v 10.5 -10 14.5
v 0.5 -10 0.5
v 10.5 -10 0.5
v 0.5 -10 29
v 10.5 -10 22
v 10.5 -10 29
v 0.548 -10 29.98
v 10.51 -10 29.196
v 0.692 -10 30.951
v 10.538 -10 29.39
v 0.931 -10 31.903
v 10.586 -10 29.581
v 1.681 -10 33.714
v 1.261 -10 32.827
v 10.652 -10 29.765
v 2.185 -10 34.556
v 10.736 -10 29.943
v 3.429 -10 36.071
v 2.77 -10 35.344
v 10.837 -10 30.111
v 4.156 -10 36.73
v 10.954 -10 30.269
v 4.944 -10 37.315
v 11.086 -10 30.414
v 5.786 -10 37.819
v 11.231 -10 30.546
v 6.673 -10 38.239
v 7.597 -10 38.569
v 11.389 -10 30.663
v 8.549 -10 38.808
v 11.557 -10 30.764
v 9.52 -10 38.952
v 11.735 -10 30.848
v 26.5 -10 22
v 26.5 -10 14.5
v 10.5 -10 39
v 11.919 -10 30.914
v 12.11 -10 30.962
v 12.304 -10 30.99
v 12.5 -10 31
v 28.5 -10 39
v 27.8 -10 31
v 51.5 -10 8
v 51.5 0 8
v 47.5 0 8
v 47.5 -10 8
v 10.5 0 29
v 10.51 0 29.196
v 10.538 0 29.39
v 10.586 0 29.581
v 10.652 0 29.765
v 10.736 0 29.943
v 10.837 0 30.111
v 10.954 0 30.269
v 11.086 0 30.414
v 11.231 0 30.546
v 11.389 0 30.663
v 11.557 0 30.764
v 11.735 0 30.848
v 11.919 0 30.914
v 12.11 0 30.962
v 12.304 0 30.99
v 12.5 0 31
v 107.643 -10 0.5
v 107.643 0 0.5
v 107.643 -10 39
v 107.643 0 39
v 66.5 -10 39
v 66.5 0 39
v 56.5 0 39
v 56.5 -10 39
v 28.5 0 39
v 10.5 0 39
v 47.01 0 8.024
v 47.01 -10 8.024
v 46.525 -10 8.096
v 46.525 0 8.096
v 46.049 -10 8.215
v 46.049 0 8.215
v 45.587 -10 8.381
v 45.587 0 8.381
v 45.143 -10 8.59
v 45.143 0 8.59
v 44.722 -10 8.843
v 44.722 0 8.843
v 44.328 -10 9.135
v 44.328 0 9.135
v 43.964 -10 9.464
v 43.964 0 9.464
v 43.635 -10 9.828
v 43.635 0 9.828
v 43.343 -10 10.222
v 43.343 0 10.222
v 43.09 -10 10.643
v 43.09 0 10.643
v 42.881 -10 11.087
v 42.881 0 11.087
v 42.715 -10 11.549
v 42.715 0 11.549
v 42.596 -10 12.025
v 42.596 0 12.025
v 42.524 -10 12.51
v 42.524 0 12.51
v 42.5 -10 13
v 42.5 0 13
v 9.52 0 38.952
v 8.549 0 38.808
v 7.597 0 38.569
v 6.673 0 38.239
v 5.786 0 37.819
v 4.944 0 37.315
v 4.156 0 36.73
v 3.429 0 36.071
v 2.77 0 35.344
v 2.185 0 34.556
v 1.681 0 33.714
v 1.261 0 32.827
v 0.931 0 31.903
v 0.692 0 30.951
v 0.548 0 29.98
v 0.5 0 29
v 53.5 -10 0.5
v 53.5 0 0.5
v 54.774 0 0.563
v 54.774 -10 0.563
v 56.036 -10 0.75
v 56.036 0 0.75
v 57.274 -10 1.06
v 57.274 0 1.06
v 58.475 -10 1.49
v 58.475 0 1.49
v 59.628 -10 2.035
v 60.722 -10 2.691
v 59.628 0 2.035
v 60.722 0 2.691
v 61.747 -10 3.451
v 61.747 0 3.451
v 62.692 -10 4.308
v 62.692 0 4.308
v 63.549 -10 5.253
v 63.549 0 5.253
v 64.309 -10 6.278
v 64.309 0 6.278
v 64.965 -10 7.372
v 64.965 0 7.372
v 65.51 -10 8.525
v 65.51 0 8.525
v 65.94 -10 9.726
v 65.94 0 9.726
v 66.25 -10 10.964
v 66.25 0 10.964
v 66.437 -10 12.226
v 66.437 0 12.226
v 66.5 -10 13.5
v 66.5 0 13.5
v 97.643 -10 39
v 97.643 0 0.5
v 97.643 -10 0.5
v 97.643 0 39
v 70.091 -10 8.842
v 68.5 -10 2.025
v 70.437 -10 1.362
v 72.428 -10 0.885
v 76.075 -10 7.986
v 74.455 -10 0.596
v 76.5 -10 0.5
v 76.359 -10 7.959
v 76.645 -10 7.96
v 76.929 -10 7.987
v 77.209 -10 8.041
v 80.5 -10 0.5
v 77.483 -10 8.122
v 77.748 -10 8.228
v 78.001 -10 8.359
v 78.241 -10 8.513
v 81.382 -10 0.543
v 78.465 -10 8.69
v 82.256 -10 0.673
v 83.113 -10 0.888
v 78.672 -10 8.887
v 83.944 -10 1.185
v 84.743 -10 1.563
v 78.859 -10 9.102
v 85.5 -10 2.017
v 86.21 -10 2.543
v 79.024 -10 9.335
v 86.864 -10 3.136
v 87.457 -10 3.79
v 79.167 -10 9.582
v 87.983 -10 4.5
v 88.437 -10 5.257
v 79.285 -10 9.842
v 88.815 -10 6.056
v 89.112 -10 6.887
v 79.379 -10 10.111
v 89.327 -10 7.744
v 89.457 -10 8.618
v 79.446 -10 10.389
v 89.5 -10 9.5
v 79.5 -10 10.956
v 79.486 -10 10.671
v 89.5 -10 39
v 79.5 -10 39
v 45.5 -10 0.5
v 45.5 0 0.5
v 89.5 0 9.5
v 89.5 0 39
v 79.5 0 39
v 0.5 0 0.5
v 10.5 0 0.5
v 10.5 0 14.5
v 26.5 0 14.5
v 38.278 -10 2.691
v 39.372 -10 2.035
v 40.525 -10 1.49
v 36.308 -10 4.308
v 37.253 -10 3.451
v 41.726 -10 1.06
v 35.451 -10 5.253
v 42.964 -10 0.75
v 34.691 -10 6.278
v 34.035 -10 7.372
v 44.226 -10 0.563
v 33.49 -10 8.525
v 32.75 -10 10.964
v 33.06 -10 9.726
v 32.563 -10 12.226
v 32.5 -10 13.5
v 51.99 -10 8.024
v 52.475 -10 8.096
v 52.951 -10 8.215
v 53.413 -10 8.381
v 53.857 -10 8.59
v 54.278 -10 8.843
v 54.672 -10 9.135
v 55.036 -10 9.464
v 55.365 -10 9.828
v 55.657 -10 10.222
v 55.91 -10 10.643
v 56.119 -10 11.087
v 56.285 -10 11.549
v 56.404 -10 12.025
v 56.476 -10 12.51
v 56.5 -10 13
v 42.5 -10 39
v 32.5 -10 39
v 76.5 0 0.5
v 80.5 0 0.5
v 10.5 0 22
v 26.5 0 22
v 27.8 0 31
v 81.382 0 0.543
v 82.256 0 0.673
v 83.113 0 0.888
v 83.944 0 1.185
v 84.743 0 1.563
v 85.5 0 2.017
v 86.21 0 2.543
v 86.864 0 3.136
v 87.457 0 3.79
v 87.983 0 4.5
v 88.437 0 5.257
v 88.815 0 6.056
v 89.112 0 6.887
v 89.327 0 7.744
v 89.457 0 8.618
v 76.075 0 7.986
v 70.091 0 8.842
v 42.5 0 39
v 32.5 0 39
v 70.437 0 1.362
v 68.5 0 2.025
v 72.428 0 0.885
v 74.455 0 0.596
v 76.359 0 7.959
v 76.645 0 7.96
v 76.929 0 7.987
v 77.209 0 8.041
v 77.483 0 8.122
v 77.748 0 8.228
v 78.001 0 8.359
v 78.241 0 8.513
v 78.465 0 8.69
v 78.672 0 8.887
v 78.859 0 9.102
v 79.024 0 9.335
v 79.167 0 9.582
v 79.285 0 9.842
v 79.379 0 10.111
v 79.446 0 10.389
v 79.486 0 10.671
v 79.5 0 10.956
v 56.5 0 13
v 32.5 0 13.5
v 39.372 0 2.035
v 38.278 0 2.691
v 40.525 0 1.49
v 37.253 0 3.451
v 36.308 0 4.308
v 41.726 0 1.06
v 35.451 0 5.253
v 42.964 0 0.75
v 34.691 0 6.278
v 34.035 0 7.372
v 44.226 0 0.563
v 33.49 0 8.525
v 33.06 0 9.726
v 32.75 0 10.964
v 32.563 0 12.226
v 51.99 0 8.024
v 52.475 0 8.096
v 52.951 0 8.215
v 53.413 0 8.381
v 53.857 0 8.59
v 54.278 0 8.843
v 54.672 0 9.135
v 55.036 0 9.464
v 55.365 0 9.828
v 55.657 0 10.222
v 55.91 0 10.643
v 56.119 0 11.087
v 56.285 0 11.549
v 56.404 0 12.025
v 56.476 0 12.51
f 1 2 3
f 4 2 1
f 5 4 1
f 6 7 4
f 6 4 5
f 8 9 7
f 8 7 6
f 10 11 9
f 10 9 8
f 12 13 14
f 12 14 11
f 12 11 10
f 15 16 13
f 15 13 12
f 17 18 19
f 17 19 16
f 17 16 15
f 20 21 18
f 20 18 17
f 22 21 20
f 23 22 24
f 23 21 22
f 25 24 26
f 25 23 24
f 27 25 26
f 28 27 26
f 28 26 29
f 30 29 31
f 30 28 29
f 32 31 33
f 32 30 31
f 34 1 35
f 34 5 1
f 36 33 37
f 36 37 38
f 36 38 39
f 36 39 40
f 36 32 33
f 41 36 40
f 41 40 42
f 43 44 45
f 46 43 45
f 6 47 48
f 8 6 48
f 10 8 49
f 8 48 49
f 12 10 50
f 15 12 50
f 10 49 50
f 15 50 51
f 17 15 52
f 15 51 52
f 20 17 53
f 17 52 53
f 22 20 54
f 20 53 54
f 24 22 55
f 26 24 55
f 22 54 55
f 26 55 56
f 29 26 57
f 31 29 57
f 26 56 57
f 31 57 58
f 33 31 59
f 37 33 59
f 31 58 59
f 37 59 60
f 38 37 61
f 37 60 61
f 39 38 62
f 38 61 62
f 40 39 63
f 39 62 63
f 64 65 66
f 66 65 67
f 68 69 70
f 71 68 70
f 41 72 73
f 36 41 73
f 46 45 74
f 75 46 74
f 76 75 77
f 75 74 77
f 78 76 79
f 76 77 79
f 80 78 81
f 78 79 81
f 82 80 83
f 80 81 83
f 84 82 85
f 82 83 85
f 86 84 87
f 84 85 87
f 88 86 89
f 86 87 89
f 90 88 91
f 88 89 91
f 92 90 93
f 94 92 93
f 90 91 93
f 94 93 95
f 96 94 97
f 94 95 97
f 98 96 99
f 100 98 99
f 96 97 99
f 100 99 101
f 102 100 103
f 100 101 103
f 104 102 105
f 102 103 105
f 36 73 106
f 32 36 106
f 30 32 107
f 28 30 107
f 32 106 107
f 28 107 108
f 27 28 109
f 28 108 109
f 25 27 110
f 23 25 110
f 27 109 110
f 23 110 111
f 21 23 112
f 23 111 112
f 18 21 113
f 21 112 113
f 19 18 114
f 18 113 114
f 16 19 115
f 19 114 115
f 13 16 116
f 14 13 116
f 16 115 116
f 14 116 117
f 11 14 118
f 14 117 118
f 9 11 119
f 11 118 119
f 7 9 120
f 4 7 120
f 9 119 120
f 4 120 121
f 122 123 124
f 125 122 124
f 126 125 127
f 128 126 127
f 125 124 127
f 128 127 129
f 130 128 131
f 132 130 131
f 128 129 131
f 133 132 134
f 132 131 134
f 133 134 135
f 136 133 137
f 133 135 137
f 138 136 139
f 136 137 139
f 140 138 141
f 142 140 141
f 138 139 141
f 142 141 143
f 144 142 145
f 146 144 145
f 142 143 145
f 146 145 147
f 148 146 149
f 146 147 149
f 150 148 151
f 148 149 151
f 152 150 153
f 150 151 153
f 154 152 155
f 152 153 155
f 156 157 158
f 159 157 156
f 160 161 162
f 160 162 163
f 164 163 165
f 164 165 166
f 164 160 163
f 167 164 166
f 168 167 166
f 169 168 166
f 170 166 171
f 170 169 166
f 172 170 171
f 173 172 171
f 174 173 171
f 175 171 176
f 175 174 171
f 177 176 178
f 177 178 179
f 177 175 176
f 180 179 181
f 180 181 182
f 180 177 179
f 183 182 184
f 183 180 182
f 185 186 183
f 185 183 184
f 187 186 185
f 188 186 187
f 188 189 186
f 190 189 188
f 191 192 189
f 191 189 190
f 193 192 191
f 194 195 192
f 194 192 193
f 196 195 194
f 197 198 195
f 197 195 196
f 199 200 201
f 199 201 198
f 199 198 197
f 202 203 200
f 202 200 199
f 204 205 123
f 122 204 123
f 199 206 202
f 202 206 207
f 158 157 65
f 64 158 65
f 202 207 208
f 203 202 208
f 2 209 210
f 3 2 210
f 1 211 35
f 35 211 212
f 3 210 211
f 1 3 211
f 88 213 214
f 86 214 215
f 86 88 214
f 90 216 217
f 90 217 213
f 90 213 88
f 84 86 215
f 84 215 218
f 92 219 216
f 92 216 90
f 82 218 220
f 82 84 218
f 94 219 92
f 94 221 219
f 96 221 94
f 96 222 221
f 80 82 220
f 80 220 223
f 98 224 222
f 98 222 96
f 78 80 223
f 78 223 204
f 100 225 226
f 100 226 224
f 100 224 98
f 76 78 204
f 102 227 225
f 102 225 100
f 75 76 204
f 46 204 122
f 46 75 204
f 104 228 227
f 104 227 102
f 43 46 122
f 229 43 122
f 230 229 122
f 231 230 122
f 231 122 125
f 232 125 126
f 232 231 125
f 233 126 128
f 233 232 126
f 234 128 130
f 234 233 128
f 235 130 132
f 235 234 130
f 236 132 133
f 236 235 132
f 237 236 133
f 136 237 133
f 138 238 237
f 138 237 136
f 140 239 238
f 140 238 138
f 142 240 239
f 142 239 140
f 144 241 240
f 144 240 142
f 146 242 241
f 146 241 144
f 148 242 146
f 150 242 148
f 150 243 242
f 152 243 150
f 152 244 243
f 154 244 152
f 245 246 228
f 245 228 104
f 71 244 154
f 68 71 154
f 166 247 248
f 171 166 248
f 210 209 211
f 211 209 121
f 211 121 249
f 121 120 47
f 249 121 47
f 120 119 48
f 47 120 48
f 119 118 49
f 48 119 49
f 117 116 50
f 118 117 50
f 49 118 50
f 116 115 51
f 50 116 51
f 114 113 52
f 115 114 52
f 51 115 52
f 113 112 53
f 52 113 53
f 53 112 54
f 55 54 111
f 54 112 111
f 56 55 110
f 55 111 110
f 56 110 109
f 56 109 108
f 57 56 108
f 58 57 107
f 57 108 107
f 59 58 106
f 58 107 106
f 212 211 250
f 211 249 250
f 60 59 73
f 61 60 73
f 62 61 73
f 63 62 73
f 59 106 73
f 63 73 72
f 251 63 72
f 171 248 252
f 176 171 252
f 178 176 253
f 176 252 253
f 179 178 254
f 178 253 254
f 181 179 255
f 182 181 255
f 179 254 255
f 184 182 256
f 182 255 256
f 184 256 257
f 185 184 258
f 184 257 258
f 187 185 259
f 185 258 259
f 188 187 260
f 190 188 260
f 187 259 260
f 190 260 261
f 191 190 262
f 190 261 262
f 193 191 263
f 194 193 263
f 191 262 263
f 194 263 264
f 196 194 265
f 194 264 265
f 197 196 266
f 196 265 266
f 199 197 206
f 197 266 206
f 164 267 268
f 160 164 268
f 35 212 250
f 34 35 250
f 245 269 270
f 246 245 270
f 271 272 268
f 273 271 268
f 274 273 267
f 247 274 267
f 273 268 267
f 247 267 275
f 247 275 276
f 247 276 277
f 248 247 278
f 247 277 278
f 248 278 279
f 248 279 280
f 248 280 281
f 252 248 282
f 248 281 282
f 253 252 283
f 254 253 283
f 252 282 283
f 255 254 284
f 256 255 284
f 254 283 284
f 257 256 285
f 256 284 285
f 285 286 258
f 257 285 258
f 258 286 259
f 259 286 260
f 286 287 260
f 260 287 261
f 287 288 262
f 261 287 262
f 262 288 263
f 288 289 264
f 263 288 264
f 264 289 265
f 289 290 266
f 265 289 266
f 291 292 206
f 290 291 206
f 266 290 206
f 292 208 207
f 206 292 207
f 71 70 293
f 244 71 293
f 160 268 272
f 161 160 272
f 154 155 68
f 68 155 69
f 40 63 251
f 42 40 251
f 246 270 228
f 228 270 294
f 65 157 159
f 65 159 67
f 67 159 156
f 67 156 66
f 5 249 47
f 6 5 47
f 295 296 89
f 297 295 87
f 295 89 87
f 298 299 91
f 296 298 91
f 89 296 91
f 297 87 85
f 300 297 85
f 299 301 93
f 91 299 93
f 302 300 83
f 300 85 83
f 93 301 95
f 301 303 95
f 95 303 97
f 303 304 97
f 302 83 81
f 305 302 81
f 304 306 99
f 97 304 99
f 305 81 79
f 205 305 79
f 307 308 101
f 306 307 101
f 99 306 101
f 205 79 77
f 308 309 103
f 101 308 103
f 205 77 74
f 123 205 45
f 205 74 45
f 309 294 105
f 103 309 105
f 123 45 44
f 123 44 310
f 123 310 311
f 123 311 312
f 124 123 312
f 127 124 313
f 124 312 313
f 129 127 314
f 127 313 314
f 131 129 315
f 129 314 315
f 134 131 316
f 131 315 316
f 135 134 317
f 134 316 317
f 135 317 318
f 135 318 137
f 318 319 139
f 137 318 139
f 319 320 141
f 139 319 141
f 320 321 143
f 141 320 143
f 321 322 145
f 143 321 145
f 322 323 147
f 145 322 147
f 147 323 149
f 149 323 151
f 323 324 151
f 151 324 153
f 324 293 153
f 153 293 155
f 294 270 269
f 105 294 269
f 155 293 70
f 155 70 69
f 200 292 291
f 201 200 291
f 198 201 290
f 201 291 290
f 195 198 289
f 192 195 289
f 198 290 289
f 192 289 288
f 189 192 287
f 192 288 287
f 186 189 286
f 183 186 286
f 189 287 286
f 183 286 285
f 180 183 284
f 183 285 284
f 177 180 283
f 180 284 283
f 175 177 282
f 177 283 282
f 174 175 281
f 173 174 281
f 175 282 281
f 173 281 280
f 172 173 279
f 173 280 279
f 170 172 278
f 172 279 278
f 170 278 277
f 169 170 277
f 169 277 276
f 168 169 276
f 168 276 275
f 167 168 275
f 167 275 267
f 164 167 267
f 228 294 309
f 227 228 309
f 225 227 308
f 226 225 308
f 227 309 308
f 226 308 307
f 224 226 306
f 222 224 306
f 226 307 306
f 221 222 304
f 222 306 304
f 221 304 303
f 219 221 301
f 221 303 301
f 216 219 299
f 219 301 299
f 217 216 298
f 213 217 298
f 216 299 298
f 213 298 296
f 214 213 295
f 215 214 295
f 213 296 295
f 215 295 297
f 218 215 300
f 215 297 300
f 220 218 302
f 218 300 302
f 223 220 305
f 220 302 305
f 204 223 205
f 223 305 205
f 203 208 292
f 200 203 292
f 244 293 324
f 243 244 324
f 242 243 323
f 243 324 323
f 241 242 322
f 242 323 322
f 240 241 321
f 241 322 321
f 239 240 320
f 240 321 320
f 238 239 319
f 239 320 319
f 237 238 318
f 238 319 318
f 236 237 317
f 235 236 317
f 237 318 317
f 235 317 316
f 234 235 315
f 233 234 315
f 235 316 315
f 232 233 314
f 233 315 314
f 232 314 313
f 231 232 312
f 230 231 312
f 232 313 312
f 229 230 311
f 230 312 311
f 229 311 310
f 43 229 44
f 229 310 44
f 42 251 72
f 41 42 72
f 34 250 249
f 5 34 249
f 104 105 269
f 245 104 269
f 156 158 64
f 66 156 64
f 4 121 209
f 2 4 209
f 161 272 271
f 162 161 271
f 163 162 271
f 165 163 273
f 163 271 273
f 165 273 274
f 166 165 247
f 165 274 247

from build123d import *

# Parameters (mm, degrees)
F0_W     = 10
F0_H     = 38.5
F1_DEPTH = 10


with BuildPart() as f1:
    # F0 (on Front) → F1 (new body)
    with BuildSketch(Plane.XZ):
        with BuildLine():
            Line((27.800091, 31), (28.5, 39))
            Line((28.5, 39), (10.5, 39))
            ThreePointArc((10.5, 39), (3.428932, 36.071068), (0.5, 29))
            Line((0.5, 29), (0.5, 0.5))
            Line((0.5, 0.5), (10.5, 0.5))
            Line((10.5, 0.5), (10.5, 14.5))
            Line((10.5, 14.5), (26.5, 14.5))
            Line((26.5, 14.5), (26.5, 22))
            Line((26.5, 22), (10.5, 22))
            Line((10.5, 22), (10.5, 29))
            ThreePointArc((10.5, 29), (11.085786, 30.414214), (12.5, 31))
            Line((12.5, 31), (27.800091, 31))
        make_face()
        with BuildLine():
            Line((51.5, 8), (47.5, 8))
            ThreePointArc((47.5, 8), (43.964466, 9.464466), (42.5, 13))
            Line((42.5, 13), (42.5, 39))
            Line((42.5, 39), (32.5, 39))
            Line((32.5, 39), (32.5, 13.5))
            ThreePointArc((32.5, 13.5), (36.307612, 4.307612), (45.5, 0.5))
            Line((45.5, 0.5), (53.5, 0.5))
            ThreePointArc((53.5, 0.5), (62.692388, 4.307612), (66.5, 13.5))
            Line((66.5, 13.5), (66.5, 39))
            Line((66.5, 39), (56.5, 39))
            Line((56.5, 39), (56.5, 13))
            ThreePointArc((56.5, 13), (55.035534, 9.464466), (51.5, 8))
        make_face()
        with BuildLine():
            Line((89.5, 39), (79.5, 39))
            Line((79.5, 39), (79.5, 10.956046))
            ThreePointArc((79.5, 10.956046), (78.465474, 8.68957), (76.075391, 7.986247))
            Line((76.075391, 7.986247), (70.090932, 8.841878))
            Line((70.090932, 8.841878), (68.5, 2.025065))
            ThreePointArc((68.5, 2.025065), (72.427967, 0.884669), (76.5, 0.5))
            Line((76.5, 0.5), (80.5, 0.5))
            ThreePointArc((80.5, 0.5), (86.863961, 3.136039), (89.5, 9.5))
            Line((89.5, 9.5), (89.5, 39))
        make_face()
        with Locations((102.642857, 19.75)):
            Rectangle(F0_W, F0_H)
    extrude(amount=F1_DEPTH)


solid = f1.part
